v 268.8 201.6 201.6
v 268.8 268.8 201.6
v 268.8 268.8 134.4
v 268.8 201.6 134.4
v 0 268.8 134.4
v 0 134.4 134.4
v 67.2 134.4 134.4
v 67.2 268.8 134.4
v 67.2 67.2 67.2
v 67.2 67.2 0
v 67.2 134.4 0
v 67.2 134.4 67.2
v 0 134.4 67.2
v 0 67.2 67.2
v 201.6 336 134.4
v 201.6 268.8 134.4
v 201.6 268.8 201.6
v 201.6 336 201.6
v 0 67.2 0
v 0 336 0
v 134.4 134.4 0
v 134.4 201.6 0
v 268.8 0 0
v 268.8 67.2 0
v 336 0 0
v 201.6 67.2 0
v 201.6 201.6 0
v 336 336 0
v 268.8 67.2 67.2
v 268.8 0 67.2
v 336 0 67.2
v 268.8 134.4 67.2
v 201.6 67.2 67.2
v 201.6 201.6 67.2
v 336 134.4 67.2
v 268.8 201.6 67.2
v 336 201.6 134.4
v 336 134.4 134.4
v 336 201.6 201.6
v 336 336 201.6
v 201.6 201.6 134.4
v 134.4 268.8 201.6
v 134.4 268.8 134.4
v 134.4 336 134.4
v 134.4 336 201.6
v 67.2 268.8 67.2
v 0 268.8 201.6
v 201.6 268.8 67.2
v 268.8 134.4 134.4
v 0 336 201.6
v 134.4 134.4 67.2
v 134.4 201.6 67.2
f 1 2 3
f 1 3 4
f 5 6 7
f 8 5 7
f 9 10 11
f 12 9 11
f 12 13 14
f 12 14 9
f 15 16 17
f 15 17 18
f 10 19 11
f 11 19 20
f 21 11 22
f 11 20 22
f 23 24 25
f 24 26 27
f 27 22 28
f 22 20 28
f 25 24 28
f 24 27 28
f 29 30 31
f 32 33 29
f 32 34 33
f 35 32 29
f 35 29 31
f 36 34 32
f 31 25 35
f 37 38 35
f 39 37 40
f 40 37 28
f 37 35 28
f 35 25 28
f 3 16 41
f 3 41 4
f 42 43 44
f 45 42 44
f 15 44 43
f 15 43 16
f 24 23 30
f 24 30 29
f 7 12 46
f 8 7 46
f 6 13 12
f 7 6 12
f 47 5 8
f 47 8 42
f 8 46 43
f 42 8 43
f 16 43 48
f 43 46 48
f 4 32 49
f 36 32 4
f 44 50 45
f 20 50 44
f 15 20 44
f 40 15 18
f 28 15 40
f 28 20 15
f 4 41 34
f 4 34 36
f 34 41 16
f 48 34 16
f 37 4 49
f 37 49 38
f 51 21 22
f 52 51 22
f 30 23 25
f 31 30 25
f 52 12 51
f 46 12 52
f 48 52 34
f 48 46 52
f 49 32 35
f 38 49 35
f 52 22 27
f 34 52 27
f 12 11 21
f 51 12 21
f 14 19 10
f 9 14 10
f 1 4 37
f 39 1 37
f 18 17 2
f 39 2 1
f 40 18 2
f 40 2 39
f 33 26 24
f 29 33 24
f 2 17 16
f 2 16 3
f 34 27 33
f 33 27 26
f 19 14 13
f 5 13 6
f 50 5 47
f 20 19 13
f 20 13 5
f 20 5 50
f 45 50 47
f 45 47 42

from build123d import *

# Parameters (mm, degrees)
F0_W     = 67.2
F0_H     = 67.2
F1_DEPTH = 201.6
F2_DEPTH = 134.4
F3_DEPTH = 67.2


with BuildPart() as f1:
    # F0 (on Top) → F1 (new body)
    with BuildSketch(Plane.XY):
        with Locations((33.6, 302.4)):
            Rectangle(F0_W, F0_H)
        with Locations((302.4, 302.4)):
            Rectangle(F0_W, F0_H)
        with Locations((302.4, 235.2)):
            Rectangle(F0_W, F0_H)
        with Locations((100.8, 302.4)):
            Rectangle(F0_W, F0_H)
        with Locations((235.2, 302.4)):
            Rectangle(F0_W, F0_H)
    extrude(amount=F1_DEPTH)



with BuildPart() as f2:
    # F0 (on Top) → F2 (new body)
    with BuildSketch(Plane.XY):
        with Locations((33.6, 235.2)):
            Rectangle(F0_W, F0_H)
        with Locations((33.6, 168)):
            Rectangle(F0_W, F0_H)
        with Locations((235.2, 235.2)):
            Rectangle(F0_W, F0_H)
        with Locations((302.4, 168)):
            Rectangle(F0_W, F0_H)
        with Locations((168, 302.4)):
            Rectangle(F0_W, F0_H)
    extrude(amount=F2_DEPTH)


with BuildPart() as f1_1:
    add(f1.part)

    add(f2.part)  # F3 merges F2
    # F0 (on Top) → F3 (join)
    with BuildSketch(Plane.XY):
        with Locations((100.8, 168)):
            Rectangle(F0_W, F0_H)
        with Locations((33.6, 100.8)):
            Rectangle(F0_W, F0_H)
        with Locations((235.2, 100.8)):
            Rectangle(F0_W, F0_H)
        with Locations((302.4, 100.8)):
            Rectangle(F0_W, F0_H)
        with Locations((235.2, 168)):
            Rectangle(F0_W, F0_H)
        with Locations((100.8, 235.2)):
            Rectangle(F0_W, F0_H)
        with Locations((168, 235.2)):
            Rectangle(F0_W, F0_H)
        with Locations((302.4, 33.6)):
            Rectangle(F0_W, F0_H)
    extrude(amount=F3_DEPTH)


solid = f1_1.part
